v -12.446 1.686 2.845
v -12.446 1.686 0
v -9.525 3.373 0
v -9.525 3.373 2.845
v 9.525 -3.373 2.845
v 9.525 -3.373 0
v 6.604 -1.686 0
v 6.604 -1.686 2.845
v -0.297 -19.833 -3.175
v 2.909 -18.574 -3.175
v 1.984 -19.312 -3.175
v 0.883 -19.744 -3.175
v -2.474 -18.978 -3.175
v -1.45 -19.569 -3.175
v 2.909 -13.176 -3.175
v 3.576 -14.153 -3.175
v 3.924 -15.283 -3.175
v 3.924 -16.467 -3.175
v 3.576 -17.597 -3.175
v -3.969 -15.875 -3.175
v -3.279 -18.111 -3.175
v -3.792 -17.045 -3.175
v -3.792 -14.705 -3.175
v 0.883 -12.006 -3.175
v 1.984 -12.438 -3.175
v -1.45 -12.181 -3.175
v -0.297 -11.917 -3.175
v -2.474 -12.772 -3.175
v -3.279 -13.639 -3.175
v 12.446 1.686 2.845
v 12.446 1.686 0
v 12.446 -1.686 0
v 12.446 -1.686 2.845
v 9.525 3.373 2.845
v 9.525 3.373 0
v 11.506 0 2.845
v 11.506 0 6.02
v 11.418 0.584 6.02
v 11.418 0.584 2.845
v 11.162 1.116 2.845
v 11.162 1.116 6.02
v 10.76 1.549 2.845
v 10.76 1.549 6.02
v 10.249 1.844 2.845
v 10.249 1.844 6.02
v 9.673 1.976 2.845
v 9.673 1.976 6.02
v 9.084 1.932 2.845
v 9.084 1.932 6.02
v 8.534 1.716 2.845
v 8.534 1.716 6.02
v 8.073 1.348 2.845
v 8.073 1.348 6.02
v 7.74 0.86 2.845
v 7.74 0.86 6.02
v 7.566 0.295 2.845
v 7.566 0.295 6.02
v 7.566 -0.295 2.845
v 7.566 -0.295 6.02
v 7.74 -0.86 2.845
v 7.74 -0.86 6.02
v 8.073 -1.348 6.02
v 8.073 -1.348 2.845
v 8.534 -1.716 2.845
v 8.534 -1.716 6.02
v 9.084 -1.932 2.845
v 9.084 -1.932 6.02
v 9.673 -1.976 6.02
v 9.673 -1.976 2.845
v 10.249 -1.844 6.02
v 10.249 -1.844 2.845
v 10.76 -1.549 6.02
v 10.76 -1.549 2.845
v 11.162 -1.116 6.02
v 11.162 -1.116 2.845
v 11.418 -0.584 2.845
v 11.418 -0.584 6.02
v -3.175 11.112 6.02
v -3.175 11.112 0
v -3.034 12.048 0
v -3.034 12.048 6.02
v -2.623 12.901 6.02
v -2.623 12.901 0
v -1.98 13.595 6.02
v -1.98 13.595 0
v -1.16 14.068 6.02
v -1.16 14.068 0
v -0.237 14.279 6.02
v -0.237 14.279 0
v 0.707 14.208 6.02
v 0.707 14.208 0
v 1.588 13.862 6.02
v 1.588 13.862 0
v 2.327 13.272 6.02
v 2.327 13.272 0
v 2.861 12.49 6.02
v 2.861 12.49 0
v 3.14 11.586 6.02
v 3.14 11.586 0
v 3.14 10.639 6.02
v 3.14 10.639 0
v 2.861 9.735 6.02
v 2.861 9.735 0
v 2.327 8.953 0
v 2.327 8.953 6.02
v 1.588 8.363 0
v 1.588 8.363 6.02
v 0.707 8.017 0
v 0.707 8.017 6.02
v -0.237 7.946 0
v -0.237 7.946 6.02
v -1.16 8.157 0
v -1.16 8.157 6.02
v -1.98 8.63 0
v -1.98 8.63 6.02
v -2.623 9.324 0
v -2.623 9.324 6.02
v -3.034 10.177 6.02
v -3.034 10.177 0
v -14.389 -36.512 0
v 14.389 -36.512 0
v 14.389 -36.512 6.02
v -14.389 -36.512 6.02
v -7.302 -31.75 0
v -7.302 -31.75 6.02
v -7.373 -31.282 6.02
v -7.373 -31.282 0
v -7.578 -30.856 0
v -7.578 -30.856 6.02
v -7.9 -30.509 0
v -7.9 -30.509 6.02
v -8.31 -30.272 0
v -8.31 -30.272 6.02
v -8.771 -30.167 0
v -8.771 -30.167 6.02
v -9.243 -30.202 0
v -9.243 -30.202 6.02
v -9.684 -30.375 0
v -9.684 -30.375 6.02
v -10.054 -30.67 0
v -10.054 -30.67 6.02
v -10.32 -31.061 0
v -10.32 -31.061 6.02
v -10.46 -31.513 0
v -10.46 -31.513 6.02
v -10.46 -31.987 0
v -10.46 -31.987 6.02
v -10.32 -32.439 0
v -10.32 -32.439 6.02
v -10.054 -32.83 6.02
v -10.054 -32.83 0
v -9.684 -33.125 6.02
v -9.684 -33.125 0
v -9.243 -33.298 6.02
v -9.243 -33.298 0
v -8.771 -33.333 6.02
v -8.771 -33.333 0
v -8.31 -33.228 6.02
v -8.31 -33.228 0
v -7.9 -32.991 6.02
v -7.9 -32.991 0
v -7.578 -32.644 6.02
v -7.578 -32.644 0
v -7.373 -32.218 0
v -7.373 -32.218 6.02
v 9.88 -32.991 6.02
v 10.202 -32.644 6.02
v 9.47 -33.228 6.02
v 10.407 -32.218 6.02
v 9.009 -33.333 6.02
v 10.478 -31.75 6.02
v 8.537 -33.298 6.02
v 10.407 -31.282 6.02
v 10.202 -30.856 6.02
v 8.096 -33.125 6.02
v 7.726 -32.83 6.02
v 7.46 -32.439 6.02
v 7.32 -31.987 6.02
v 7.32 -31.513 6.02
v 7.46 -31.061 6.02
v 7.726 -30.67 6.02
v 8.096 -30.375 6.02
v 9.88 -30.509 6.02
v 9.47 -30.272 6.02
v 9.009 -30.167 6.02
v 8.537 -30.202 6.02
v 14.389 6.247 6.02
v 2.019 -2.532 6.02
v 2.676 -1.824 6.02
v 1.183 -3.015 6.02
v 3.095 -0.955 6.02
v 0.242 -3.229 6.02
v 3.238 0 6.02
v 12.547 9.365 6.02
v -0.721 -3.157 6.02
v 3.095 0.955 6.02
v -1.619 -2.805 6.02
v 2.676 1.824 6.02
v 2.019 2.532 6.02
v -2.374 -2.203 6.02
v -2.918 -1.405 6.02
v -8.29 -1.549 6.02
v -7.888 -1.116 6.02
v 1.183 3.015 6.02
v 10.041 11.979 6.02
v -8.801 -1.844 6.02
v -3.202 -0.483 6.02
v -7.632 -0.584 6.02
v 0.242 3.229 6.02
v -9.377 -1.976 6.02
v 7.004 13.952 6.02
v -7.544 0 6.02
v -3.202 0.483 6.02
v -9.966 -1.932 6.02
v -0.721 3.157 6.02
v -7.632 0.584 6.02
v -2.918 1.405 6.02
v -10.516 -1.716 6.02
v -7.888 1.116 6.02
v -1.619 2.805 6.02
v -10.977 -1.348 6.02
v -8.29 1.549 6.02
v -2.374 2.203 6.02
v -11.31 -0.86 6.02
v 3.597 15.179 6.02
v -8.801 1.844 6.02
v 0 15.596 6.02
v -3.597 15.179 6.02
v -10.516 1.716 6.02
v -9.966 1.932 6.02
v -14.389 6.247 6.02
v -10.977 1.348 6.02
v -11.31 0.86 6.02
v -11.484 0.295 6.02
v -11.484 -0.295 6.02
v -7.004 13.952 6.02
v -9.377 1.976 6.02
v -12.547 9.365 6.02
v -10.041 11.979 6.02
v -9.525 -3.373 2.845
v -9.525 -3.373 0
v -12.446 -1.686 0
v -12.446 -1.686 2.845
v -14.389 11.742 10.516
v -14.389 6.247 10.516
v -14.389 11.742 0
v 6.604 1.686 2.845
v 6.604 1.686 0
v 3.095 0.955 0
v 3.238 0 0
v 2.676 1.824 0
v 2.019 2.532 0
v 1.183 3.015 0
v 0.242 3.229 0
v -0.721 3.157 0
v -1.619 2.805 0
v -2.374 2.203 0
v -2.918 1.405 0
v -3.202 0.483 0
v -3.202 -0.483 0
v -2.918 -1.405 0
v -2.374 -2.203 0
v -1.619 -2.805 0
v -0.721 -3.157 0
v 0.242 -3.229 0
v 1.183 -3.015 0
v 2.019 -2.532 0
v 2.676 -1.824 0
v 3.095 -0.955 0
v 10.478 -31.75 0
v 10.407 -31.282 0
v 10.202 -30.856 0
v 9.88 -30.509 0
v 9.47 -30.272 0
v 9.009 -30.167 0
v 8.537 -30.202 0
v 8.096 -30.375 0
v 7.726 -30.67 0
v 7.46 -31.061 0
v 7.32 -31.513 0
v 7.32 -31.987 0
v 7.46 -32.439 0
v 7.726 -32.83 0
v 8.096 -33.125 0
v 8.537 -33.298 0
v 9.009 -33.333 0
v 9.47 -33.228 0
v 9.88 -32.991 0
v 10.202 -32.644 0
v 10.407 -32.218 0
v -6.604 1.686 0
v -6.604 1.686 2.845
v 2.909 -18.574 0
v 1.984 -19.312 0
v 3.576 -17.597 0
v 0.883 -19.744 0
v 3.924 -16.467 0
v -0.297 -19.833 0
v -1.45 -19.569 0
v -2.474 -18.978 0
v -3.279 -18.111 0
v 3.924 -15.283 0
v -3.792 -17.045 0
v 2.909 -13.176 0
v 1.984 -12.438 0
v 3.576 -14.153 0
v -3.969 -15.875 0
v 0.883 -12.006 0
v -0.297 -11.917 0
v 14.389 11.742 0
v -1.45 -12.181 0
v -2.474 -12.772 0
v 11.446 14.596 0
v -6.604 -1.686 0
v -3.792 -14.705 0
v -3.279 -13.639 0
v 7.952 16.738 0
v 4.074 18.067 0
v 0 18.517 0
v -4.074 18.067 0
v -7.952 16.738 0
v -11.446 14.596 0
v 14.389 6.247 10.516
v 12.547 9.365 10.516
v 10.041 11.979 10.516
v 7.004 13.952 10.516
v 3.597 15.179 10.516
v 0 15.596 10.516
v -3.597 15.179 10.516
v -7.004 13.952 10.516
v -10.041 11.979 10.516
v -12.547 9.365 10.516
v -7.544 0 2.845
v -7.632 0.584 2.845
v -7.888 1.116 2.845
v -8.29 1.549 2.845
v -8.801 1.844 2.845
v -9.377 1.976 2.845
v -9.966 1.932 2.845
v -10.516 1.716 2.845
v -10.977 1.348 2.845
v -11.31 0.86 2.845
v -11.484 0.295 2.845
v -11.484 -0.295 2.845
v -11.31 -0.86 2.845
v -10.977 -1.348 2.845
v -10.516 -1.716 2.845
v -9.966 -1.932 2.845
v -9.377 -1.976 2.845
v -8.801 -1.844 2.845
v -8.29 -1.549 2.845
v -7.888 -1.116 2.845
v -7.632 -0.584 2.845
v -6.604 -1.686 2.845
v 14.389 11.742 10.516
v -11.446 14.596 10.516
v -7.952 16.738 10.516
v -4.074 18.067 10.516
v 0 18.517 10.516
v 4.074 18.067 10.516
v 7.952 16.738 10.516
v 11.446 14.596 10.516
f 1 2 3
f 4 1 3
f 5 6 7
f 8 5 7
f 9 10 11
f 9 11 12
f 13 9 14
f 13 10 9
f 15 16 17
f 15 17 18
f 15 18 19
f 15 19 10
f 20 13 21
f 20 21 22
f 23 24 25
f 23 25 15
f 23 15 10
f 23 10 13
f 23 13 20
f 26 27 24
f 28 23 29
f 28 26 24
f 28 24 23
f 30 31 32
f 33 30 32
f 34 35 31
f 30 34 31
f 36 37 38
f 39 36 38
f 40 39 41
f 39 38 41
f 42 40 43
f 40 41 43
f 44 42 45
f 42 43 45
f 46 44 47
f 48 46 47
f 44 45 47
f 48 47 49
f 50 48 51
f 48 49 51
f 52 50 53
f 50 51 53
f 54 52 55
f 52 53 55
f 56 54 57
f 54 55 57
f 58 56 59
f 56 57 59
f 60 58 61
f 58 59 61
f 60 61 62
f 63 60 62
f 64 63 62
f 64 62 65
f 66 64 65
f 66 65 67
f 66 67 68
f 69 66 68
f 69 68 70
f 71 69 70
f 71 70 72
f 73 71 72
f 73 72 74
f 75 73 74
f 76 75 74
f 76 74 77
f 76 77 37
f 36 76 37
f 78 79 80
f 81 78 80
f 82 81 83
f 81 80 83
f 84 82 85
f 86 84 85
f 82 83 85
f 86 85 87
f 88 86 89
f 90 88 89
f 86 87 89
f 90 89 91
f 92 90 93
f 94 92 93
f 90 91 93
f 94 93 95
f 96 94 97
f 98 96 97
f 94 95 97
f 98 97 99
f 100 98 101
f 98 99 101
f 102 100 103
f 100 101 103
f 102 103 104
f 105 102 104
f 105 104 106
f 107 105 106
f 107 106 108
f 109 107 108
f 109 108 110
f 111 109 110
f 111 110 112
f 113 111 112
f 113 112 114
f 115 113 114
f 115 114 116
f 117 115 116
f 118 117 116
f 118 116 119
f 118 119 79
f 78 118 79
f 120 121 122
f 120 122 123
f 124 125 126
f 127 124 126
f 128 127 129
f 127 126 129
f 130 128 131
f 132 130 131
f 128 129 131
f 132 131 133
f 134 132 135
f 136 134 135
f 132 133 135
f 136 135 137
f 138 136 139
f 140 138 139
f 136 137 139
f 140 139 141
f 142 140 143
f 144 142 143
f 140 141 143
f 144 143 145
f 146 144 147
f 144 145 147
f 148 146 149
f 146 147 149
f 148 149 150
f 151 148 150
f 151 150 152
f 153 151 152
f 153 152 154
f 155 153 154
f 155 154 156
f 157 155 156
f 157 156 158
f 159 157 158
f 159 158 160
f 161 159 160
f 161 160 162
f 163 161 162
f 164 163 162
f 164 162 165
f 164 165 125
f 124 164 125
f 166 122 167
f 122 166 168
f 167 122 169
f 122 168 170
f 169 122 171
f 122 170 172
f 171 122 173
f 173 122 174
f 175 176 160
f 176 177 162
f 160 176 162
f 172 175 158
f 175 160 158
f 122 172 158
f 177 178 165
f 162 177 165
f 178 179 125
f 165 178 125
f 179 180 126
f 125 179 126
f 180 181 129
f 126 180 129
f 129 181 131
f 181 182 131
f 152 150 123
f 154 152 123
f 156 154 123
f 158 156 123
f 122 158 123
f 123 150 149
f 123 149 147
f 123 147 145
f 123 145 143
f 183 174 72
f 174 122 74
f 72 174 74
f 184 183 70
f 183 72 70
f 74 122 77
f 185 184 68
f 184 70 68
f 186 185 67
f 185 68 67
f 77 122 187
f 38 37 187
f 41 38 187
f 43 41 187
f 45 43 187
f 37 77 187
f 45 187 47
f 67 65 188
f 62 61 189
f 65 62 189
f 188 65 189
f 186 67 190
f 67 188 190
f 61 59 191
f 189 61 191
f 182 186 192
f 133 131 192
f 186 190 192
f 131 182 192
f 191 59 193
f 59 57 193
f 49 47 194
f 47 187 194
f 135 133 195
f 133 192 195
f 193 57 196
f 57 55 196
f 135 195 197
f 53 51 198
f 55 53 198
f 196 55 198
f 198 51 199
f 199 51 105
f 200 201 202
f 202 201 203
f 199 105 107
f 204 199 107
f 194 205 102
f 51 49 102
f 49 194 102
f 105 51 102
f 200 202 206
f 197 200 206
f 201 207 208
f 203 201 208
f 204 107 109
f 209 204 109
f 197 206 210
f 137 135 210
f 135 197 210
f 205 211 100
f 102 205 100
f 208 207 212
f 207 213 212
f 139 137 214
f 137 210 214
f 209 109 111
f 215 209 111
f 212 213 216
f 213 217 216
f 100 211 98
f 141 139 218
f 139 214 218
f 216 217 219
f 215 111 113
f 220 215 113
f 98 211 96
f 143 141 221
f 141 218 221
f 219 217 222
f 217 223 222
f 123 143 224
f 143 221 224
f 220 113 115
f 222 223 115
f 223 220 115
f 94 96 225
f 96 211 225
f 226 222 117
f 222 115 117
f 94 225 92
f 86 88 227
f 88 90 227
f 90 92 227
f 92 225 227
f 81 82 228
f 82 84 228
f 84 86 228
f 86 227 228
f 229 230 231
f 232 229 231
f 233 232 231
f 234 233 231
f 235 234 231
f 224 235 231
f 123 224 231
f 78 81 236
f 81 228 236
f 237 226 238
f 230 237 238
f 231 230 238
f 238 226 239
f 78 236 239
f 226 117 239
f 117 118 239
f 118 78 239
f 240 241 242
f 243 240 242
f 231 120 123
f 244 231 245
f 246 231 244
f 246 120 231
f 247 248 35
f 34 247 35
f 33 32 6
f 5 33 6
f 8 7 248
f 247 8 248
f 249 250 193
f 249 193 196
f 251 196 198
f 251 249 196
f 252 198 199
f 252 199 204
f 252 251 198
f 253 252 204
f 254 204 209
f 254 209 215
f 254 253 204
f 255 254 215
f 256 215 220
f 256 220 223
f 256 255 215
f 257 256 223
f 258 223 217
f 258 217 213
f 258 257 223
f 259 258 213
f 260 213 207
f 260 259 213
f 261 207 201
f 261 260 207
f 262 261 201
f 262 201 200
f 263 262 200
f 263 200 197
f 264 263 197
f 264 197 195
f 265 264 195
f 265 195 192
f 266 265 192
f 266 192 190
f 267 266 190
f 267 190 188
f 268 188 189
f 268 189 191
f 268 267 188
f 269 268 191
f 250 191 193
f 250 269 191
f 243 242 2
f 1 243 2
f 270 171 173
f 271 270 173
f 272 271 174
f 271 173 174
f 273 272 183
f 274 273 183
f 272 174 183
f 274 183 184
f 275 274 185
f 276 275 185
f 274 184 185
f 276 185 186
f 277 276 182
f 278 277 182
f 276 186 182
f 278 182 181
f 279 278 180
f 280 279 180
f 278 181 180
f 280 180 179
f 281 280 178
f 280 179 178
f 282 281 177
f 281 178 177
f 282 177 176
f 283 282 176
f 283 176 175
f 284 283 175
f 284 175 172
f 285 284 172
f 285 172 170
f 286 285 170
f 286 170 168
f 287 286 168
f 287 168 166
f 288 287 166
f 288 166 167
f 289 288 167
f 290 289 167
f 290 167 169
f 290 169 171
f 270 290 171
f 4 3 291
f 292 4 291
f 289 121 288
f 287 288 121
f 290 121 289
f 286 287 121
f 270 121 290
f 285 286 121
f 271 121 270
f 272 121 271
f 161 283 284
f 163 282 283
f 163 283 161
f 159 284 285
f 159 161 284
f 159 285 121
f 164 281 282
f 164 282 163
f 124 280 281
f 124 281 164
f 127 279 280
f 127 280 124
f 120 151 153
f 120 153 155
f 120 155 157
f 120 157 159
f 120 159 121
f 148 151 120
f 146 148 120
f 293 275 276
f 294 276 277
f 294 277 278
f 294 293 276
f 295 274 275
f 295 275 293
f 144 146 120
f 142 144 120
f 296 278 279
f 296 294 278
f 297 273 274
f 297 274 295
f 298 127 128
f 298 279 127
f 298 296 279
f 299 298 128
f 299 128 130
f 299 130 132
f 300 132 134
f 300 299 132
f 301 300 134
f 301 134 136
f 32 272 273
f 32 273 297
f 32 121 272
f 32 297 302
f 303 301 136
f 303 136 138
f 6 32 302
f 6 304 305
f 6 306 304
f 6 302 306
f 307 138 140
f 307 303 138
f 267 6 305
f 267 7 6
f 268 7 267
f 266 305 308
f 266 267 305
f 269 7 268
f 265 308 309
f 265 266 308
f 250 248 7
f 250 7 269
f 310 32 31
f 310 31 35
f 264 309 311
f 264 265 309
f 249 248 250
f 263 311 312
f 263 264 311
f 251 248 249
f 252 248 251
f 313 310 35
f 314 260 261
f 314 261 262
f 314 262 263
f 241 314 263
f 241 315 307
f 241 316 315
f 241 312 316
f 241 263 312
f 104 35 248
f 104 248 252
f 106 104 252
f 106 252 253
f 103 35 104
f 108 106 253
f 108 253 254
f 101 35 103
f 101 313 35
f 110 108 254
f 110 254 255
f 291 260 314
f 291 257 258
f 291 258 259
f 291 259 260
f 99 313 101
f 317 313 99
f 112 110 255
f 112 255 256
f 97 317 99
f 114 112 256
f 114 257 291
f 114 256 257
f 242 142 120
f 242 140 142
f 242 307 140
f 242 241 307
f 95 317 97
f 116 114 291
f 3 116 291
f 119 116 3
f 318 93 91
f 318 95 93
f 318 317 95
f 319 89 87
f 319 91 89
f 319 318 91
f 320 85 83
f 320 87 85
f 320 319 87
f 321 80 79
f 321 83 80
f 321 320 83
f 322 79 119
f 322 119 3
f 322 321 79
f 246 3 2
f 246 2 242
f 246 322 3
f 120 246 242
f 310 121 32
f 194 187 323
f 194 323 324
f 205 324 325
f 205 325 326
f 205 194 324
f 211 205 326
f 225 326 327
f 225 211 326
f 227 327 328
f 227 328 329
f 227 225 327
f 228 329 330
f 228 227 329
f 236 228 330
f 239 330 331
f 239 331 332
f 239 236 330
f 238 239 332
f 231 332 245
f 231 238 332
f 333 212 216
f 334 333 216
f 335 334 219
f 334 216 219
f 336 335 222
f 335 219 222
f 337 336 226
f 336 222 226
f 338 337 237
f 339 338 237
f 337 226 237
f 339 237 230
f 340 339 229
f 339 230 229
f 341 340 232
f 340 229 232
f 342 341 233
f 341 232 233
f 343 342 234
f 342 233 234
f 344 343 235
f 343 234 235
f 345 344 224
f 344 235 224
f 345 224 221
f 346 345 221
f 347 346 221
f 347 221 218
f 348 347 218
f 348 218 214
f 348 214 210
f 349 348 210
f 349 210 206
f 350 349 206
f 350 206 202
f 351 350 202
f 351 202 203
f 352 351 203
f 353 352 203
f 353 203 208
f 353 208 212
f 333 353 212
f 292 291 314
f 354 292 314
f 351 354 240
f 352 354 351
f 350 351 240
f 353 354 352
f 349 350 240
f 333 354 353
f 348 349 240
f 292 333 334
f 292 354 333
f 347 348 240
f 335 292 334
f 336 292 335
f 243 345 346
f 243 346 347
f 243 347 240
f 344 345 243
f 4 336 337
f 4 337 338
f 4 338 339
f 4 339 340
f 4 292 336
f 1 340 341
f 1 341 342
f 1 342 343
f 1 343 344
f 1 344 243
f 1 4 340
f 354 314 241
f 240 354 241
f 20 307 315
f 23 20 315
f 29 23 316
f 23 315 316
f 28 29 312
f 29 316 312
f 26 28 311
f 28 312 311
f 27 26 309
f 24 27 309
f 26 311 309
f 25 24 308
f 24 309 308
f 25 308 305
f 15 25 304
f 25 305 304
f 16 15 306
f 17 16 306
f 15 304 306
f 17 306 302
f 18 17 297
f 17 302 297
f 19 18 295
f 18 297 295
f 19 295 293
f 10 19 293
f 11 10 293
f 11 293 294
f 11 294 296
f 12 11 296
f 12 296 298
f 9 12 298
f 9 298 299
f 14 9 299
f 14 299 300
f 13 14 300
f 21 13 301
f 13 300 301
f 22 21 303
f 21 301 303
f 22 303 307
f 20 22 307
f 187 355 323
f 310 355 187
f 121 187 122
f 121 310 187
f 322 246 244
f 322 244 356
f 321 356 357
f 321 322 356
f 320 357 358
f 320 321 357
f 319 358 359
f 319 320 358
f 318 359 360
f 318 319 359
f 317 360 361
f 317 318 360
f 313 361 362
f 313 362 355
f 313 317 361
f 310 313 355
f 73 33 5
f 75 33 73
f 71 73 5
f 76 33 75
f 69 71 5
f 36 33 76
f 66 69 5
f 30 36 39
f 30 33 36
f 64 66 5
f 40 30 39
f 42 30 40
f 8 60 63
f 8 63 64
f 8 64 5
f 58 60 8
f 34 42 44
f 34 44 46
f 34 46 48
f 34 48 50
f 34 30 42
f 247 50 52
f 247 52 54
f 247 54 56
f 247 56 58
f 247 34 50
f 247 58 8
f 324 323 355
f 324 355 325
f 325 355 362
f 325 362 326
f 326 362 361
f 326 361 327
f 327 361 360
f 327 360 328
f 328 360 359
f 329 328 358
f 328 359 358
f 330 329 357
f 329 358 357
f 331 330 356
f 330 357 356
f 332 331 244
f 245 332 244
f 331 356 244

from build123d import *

# Parameters (mm, degrees)
SKETCH2_R                            = 3.2385
BOSS_EXTRUDE1_DEPTH                  = 6.0198
BOSS_EXTRUDE5_DEPTH                  = 4.4958
SKETCH5_R                            = 1.9812
CUT_EXTRUDE2_ENCODERSCREWHOLES_DEPTH = 40.704494042
CUT_EXTRUDE4_DEPTH                   = 2.8448
SKETCH13_R                           = 1.5875
CUT_EXTRUDE5_DEPTH                   = 40.704494042
SKETCH7_R                            = 3.96875
BOSS_EXTRUDE4_DEPTH                  = 3.175
SKETCH14_R                           = 3.175
CUT_EXTRUDE6_DEPTH                   = 41.629874457


with BuildPart() as part:
    # Sketch2 → Boss-Extrude1 (new body)
    with BuildSketch(Plane.XY):
        with BuildLine():
            Line((14.3891, -36.5125), (-14.3891, -36.5125))
            Line((-14.3891, -36.5125), (-14.3891, 11.742361964))
            ThreePointArc((-14.3891, 11.742361964), (0, 18.5166), (14.3891, 11.742361964))
            Line((14.3891, 11.742361964), (14.3891, -36.5125))
        make_face()
        Circle(SKETCH2_R, mode=Mode.SUBTRACT)
    extrude(amount=BOSS_EXTRUDE1_DEPTH)

    # Sketch12 → Boss-Extrude5 (add)
    with BuildSketch(Plane.XY.offset(6.0198)):
        with BuildLine():
            Line((-14.3891, 6.247076947), (-14.3891, 11.742361964))
            ThreePointArc((-14.3891, 11.742361964), (0, 18.5166), (14.3891, 11.742361964))
            Line((14.3891, 11.742361964), (14.3891, 6.247076947))
            ThreePointArc((14.3891, 6.247076947), (0, 15.5956), (-14.3891, 6.247076947))
        make_face()
    extrude(amount=BOSS_EXTRUDE5_DEPTH)

    # Sketch5 → Cut-Extrude2_EncoderScrewHoles (cut, through all)
    with BuildSketch(Plane.XY.offset(6.0198)):
        with Locations((-9.525, 0)):
            Circle(SKETCH5_R)
        with Locations((9.525, 0)):
            Circle(SKETCH5_R)
    extrude(amount=-CUT_EXTRUDE2_ENCODERSCREWHOLES_DEPTH, mode=Mode.SUBTRACT)

    # Sketch11 → Cut-Extrude4 (cut)
    with BuildSketch(Plane(origin=(0, 0, 0), x_dir=(-1, 0, 0), z_dir=(0, 0, -1))):
        Polygon((9.525, -3.372880273), (12.446, -1.686440136), (12.446, 1.686440136), (9.525, 3.372880273), (6.604, 1.686440136), (6.604, -1.686440136), align=None)
        Polygon((-6.604, -1.686440136), (-6.604, 1.686440136), (-9.525, 3.372880273), (-12.446, 1.686440136), (-12.446, -1.686440136), (-9.525, -3.372880273), align=None)
    extrude(amount=-CUT_EXTRUDE4_DEPTH, mode=Mode.SUBTRACT)

    # Sketch13 → Cut-Extrude5 (cut, through all)
    with BuildSketch(Plane.XY.offset(6.0198)):
        with Locations((8.89, -31.75)):
            Circle(SKETCH13_R)
        with Locations((-8.89, -31.75)):
            Circle(SKETCH13_R)
    extrude(amount=-CUT_EXTRUDE5_DEPTH, mode=Mode.SUBTRACT)

    # Sketch7 → Boss-Extrude4 (add)
    with BuildSketch(Plane(origin=(0, 0, 0), x_dir=(-1, 0, 0), z_dir=(0, 0, -1))):
        with Locations((0, -15.875)):
            Circle(SKETCH7_R)
    extrude(amount=BOSS_EXTRUDE4_DEPTH)

    # Sketch14 → Cut-Extrude6 (cut, through all)
    with BuildSketch(Plane(origin=(0, 0, 0), x_dir=(-1, 0, 0), z_dir=(0, 0, -1))):
        with Locations((0, 11.1125)):
            Circle(SKETCH14_R)
    extrude(amount=-CUT_EXTRUDE6_DEPTH, mode=Mode.SUBTRACT)


solid = part.part
